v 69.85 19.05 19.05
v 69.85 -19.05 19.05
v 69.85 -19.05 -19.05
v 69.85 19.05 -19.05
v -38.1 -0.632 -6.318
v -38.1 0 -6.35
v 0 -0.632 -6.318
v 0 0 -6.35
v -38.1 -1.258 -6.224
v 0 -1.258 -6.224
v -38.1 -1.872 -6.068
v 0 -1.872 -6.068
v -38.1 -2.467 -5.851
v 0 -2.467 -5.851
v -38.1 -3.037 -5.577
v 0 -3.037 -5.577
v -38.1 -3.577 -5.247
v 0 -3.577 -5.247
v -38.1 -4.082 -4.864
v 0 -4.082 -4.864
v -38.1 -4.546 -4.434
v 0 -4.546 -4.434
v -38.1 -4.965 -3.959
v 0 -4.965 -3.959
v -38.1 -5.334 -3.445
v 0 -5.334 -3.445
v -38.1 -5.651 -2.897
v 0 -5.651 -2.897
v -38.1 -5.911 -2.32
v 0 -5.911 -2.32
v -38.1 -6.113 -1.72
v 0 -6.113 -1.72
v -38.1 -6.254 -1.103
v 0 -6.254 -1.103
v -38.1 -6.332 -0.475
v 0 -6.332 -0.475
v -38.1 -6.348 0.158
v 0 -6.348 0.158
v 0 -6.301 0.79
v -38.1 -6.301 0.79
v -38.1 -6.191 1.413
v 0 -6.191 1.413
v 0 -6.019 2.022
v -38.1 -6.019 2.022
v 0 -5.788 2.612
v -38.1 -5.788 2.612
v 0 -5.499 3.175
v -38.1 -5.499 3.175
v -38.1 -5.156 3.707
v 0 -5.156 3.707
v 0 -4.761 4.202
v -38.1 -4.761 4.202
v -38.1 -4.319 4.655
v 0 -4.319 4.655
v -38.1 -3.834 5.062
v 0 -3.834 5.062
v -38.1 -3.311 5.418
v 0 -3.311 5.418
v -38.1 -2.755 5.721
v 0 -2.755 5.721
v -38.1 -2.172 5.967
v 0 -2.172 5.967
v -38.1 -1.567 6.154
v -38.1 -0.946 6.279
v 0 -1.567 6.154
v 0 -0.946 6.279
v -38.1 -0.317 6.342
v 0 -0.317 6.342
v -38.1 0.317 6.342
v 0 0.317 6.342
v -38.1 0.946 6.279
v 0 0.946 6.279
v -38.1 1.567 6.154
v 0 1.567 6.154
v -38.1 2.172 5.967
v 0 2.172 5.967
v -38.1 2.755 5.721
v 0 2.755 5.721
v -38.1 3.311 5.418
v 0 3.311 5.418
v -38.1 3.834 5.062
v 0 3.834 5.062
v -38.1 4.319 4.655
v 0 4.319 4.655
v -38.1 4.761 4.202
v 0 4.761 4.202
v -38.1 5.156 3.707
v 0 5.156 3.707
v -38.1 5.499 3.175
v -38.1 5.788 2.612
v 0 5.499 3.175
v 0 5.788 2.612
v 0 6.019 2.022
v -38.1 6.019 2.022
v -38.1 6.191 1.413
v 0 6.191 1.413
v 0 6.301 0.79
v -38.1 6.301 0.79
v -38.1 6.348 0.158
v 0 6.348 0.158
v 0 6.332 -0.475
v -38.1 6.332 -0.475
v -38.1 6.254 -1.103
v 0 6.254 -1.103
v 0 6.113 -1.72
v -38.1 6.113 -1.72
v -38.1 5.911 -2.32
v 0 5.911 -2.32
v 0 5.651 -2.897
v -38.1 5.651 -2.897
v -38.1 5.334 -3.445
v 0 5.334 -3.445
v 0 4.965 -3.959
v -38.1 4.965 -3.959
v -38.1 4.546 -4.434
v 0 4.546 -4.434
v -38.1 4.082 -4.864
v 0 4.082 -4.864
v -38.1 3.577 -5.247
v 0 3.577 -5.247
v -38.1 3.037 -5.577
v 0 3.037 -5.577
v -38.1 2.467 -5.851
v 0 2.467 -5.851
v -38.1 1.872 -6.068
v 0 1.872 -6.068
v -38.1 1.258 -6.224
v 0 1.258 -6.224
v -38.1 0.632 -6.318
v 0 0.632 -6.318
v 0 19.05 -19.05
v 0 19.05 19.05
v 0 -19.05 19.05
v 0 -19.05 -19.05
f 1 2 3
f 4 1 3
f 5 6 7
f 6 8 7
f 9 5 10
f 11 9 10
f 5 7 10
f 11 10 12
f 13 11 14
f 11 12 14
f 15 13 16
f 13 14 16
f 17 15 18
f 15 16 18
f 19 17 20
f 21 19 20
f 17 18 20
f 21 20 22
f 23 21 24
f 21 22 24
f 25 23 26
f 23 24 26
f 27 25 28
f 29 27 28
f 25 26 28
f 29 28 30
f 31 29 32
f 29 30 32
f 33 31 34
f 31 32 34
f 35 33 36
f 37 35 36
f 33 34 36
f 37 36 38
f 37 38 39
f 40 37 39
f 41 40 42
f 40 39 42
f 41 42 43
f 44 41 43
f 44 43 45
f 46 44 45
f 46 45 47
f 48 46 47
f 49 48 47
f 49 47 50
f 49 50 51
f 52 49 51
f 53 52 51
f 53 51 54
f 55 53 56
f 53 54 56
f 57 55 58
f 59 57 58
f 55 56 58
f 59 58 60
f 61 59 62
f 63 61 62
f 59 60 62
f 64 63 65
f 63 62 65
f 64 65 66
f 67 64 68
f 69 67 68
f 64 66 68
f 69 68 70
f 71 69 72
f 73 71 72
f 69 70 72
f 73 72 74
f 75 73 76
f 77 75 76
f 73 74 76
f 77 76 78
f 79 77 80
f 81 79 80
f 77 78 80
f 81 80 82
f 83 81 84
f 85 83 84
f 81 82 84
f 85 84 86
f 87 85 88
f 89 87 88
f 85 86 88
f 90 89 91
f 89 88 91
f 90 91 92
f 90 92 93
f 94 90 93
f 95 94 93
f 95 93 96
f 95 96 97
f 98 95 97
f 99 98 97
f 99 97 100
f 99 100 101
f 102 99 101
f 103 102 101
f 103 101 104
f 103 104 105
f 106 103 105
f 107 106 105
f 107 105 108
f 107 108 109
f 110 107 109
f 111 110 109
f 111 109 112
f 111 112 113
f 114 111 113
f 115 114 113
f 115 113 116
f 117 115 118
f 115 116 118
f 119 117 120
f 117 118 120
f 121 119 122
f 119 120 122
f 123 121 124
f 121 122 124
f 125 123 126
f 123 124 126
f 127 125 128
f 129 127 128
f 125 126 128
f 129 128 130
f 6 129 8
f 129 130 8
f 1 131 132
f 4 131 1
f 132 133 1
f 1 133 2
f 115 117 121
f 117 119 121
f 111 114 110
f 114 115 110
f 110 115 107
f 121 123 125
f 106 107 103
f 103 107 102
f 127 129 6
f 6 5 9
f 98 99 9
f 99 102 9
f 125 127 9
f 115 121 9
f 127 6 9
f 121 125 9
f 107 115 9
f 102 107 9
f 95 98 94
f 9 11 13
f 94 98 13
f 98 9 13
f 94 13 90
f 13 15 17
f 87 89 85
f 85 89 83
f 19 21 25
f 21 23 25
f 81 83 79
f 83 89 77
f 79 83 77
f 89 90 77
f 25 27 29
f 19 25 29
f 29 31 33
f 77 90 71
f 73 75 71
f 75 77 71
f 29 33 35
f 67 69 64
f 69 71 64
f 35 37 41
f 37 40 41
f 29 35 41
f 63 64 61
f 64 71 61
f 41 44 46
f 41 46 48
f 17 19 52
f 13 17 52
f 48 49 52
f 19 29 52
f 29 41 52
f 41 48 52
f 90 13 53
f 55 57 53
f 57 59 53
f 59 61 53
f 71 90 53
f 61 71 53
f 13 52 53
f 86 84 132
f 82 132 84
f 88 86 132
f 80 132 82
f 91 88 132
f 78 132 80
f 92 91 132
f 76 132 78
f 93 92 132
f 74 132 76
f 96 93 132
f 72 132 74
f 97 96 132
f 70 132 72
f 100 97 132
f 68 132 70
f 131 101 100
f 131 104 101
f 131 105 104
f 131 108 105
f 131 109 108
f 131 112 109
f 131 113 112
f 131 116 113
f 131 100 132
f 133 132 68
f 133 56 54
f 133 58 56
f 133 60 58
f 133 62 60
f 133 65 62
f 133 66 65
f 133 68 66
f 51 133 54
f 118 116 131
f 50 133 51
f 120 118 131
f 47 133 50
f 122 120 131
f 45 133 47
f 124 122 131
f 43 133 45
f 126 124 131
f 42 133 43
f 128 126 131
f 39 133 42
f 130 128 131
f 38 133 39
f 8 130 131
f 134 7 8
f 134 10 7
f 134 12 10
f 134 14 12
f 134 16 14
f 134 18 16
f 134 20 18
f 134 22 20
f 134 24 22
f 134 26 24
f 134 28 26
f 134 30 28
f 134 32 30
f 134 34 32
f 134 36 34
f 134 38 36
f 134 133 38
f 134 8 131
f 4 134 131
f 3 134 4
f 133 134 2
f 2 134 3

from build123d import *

# Parameters (mm, degrees)
BOSS_EXTRUDE1_DEPTH      = 19.05
BOSS_EXTRUDE1_DEPTH_BACK = 19.05
SKETCH1_W                = 69.85
SKETCH1_H                = 38.1
SKETCH3_W                = 38.1
SKETCH3_H                = 6.35


with BuildPart() as part:
    # Sketch1 → Boss-Extrude1 (new, two sides: drawn at the far end of the back side and taken through both)
    with BuildSketch(Plane(origin=(0, 0, 0), x_dir=(1, 0, 0), z_dir=(0, 1, 0)).offset(-BOSS_EXTRUDE1_DEPTH_BACK)):
        with Locations((34.925, 0)):
            Rectangle(SKETCH1_W, SKETCH1_H)
    extrude(amount=BOSS_EXTRUDE1_DEPTH + BOSS_EXTRUDE1_DEPTH_BACK)

    # Sketch3 → Revolve1 (revolve)
    with BuildSketch(Plane(origin=(0, 0, 0), x_dir=(1, 0, 0), z_dir=(0, 1, 0))):
        with Locations((-19.05, 3.175)):
            Rectangle(SKETCH3_W, SKETCH3_H)
    revolve(axis=Axis((0, 0, 0), (-1, 0, 0)))


solid = part.part
